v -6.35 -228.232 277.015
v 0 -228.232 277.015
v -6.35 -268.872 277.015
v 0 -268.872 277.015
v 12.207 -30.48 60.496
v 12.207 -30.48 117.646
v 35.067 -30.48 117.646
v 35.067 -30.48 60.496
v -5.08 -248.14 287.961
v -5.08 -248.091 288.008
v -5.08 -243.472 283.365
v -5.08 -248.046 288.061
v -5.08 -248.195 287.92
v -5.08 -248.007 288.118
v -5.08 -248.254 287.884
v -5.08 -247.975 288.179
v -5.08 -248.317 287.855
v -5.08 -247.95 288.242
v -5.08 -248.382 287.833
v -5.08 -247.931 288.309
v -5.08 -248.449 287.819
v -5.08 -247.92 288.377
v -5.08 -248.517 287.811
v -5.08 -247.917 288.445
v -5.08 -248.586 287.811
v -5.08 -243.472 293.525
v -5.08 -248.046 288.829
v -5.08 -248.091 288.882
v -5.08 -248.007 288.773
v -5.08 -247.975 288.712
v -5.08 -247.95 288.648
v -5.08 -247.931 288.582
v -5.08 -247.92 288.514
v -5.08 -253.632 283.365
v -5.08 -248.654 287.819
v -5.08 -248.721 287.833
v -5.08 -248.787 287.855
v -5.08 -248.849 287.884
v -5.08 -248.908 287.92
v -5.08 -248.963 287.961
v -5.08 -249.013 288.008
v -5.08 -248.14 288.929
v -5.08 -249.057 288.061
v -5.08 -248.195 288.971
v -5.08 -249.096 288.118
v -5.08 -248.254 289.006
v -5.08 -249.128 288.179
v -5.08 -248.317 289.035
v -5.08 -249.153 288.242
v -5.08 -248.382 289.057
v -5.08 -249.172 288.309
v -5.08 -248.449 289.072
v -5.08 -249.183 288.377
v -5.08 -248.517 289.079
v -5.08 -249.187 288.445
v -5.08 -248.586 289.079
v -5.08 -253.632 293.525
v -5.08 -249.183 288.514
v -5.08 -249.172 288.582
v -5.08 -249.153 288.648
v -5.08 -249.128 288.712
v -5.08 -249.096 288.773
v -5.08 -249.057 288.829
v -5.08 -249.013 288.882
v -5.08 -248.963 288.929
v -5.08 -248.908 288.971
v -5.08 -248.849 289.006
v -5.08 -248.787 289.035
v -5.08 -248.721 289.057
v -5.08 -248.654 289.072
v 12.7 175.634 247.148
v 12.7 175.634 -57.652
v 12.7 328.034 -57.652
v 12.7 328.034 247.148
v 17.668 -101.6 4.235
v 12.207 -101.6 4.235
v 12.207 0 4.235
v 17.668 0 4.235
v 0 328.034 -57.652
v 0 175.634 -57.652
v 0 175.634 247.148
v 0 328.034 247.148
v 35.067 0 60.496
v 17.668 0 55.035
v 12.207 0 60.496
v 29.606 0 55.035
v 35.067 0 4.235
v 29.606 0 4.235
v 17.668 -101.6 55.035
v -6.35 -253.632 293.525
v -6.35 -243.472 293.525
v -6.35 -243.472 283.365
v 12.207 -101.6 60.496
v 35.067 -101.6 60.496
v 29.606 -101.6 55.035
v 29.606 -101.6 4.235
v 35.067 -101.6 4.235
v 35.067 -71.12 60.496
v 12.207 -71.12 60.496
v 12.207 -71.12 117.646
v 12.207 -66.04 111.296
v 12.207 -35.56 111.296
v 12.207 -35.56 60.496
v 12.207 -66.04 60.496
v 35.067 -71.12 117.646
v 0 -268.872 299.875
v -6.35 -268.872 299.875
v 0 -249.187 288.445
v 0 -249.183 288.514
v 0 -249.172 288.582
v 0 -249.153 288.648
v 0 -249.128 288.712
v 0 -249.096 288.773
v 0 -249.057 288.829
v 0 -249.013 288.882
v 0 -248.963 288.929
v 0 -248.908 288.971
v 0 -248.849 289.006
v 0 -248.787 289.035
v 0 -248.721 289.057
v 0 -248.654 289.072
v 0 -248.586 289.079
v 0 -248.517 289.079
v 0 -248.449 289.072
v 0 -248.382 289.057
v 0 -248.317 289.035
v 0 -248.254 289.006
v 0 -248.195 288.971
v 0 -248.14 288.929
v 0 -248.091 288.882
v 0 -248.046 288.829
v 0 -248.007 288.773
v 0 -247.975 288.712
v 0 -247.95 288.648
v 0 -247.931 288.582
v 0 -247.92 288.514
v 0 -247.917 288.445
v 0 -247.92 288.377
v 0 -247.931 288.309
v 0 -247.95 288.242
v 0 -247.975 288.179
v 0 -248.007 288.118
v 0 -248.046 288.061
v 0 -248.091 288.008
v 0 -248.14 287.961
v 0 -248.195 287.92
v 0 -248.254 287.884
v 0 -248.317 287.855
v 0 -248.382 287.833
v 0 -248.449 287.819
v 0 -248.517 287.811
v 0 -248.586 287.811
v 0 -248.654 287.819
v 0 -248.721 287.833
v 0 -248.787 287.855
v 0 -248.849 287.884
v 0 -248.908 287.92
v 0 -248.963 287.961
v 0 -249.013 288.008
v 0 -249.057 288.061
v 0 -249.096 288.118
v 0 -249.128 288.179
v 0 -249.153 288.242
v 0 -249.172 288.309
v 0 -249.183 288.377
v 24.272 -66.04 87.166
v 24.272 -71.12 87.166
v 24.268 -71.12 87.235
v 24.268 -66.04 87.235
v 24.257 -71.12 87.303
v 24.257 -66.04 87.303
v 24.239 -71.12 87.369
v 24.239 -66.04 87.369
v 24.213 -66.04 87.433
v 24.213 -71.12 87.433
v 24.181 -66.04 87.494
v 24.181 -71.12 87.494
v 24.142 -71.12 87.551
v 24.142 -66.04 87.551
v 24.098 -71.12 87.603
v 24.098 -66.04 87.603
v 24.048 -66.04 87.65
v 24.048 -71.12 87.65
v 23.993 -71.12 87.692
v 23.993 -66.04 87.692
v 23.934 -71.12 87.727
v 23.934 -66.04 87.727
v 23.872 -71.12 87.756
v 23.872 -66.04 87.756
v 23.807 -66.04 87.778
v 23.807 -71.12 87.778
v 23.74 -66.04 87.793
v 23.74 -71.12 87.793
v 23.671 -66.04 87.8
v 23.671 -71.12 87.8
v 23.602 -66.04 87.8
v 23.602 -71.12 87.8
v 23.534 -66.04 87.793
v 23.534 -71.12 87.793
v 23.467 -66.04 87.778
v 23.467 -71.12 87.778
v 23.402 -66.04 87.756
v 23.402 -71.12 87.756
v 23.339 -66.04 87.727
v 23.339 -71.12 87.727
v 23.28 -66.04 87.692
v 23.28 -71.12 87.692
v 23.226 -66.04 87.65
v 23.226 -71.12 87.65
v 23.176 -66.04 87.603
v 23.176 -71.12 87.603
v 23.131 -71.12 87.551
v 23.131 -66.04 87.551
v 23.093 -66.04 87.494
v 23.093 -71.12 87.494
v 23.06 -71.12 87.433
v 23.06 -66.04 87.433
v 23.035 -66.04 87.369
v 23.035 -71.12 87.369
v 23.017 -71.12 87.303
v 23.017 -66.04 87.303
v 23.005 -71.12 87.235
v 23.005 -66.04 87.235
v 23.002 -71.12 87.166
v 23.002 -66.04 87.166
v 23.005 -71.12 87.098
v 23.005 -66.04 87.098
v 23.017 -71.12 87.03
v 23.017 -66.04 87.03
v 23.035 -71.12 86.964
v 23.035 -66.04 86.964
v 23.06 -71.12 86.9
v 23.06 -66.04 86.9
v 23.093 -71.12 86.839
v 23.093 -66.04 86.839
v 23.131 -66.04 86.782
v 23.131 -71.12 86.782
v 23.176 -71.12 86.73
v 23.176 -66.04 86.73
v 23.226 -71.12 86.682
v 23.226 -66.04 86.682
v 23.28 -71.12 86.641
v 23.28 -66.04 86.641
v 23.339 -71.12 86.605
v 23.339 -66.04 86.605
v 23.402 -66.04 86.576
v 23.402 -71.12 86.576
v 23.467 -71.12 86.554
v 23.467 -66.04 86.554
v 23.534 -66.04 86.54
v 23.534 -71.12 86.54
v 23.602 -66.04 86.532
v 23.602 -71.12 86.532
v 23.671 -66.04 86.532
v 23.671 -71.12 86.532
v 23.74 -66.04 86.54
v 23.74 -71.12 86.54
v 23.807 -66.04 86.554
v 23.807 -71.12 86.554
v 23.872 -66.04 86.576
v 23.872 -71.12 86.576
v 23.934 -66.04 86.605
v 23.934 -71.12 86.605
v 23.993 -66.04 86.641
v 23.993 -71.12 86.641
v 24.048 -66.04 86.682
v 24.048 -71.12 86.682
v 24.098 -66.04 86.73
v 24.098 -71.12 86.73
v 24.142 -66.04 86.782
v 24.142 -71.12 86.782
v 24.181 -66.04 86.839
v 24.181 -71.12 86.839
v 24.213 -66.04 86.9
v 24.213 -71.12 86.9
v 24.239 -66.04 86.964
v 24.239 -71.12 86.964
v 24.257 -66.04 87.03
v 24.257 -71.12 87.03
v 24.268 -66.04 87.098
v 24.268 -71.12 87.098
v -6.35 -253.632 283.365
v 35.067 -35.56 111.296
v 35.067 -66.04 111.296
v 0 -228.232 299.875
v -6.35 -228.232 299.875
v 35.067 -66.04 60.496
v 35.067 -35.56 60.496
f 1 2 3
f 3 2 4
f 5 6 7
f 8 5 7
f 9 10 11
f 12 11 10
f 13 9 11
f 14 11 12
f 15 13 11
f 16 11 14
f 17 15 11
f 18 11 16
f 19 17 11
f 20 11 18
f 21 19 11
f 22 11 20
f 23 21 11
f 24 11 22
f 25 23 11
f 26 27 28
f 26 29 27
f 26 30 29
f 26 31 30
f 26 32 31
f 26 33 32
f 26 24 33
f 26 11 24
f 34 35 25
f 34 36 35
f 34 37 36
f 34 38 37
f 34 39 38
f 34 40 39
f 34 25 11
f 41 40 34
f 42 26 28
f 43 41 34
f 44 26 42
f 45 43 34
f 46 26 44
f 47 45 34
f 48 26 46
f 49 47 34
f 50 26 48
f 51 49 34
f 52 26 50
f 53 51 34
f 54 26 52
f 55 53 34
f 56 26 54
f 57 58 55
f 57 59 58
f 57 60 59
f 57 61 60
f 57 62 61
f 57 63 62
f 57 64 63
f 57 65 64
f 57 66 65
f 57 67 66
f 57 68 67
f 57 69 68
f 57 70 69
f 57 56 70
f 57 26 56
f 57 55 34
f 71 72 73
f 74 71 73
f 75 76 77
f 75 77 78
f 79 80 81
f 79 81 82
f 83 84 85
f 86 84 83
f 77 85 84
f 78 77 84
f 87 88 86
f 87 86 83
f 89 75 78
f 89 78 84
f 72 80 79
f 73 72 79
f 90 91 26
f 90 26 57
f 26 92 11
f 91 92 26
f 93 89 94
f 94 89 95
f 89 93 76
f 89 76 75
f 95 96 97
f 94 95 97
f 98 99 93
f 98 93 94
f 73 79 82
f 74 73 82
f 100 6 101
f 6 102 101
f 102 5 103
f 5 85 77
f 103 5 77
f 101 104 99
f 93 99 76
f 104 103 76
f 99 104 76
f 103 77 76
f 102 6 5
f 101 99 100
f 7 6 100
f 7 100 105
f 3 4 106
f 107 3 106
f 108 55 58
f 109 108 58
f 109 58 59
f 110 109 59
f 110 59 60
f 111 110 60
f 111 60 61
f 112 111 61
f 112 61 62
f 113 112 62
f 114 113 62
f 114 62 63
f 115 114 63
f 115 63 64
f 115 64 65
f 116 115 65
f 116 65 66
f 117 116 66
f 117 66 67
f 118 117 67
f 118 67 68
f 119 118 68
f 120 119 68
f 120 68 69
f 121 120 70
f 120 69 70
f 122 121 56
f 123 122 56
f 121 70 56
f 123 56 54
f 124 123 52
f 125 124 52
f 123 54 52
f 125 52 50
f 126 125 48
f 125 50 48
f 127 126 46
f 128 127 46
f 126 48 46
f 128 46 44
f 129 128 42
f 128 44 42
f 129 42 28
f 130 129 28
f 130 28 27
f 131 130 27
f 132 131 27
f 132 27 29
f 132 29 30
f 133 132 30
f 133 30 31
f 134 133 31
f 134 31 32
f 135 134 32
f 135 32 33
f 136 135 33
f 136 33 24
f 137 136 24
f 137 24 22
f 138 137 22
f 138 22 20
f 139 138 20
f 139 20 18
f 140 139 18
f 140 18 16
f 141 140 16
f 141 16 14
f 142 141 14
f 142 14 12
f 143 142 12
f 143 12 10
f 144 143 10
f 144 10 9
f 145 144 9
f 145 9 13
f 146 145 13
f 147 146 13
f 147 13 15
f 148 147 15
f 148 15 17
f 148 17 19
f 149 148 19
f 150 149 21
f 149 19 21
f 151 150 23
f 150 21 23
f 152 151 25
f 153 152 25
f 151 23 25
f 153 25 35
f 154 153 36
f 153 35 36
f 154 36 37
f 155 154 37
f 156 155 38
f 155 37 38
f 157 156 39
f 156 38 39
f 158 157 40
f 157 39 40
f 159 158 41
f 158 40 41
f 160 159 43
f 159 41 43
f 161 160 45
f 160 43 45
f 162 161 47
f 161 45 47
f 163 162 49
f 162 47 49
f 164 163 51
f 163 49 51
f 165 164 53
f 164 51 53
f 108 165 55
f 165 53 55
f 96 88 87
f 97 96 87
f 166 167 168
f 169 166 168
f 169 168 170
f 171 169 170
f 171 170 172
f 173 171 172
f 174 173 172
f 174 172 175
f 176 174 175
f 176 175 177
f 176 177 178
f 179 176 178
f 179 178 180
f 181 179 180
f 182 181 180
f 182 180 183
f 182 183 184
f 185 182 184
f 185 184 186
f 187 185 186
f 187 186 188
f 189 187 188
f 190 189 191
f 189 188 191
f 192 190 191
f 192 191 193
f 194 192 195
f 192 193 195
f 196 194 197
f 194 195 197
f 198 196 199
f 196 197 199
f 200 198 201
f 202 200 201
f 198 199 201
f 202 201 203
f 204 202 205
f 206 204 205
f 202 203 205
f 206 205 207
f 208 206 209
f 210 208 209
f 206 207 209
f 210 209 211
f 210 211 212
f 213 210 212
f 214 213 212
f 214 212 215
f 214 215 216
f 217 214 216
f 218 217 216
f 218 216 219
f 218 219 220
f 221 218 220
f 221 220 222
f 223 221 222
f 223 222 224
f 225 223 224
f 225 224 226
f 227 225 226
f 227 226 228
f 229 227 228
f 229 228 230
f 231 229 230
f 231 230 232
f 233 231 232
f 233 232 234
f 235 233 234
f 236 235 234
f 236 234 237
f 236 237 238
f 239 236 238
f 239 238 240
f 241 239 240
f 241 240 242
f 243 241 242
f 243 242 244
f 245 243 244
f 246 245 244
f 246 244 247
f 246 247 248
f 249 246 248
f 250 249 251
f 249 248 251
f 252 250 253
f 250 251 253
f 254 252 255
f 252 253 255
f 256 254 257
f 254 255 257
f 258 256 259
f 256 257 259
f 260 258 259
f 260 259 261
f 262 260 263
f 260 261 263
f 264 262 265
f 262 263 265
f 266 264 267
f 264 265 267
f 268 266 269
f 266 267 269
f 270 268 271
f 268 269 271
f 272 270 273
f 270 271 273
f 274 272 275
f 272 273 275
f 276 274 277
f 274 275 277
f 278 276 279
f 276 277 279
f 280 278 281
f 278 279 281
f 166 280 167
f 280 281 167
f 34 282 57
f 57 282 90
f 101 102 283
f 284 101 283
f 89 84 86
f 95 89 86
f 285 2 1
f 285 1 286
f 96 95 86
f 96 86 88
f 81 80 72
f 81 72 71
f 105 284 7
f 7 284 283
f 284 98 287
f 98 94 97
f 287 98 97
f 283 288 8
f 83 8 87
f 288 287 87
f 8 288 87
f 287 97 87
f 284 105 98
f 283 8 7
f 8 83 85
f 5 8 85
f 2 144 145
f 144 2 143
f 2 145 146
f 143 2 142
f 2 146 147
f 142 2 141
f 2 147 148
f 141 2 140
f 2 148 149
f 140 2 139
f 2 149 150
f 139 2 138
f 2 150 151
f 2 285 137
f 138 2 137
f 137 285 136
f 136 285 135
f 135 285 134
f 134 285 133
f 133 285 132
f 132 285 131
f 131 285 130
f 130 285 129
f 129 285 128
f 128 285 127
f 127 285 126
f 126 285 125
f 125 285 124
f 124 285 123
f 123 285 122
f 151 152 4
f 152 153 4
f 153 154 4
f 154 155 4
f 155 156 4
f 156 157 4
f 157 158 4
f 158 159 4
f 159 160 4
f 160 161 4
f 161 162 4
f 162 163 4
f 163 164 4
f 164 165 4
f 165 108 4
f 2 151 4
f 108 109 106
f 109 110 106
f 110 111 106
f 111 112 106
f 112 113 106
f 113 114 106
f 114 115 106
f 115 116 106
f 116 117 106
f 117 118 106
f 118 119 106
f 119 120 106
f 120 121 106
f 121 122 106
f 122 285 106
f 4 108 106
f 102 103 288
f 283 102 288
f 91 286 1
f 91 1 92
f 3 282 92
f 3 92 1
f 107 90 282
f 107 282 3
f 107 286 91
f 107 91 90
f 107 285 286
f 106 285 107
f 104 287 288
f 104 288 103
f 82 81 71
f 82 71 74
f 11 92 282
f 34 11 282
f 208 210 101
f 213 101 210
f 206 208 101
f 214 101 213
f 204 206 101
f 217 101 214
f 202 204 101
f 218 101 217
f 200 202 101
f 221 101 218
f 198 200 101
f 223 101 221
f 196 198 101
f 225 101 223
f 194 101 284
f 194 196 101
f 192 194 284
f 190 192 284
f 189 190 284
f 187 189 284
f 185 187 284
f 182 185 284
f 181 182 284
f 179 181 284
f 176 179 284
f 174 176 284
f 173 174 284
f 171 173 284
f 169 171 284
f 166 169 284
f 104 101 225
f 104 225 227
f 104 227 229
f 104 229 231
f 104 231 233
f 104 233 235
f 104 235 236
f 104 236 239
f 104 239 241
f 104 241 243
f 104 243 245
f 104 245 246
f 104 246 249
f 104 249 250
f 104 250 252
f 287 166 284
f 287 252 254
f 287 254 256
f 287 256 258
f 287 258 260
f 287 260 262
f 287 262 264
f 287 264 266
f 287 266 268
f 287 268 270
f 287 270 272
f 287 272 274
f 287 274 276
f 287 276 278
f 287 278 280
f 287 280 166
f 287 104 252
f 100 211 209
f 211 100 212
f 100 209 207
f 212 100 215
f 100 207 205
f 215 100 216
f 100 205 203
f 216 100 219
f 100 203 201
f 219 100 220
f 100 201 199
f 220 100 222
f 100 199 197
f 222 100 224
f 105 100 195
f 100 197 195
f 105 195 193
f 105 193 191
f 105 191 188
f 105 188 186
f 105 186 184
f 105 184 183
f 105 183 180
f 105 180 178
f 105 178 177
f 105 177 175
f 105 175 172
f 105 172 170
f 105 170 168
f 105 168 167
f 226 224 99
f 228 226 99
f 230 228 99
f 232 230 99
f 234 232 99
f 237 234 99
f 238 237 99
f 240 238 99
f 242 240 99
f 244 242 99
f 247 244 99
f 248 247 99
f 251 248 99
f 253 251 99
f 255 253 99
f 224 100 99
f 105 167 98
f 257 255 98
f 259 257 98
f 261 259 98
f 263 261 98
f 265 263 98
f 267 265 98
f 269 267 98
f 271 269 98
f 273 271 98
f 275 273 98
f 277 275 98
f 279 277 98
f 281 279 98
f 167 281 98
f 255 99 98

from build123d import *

# Parameters (mm, degrees)
F1_DEPTH  = 101.6
F2_W      = 152.4
F2_H      = 304.8
F3_DEPTH  = 12.7
F4_W      = 22.86
F4_H      = 5.08
F5_DEPTH  = 50.8
F6_W      = 22.86
F6_H      = 5.08
F6_H_2    = 96.52
F7_DEPTH  = 6.35
F8_R      = 1.27
F9_DEPTH  = 7.62
F10_W     = 22.86
F10_H     = 30.48
F10_R     = 1.27
F11_DEPTH = 57.15
F12_R     = 0.635
F13_DEPTH = 25.4
F14_W     = 40.64
F14_H     = 22.86
F15_DEPTH = 6.35
F16_R     = 0.635
F17_DEPTH = 25.4
F18_W     = 10.16
F18_H     = 10.16
F19_DEPTH = 1.27


with BuildPart() as f1:
    # F0 (on Front) → F1 (new body)
    with BuildSketch(Plane.XZ):
        Polygon((12.206776, 4.235318), (17.667776, 4.235318), (17.667776, 55.035318), (29.605776, 55.035318), (29.605776, 4.235318), (35.066776, 4.235318), (35.066776, 60.496318), (12.206776, 60.496318), align=None)
    extrude(amount=F1_DEPTH)

    # F4 (on face) → F5 (join)
    with BuildSketch(Plane.XY.offset(60.496318)):
        with Locations((23.636776, -2.54)):
            Rectangle(F4_W, F4_H)
        with Locations((23.636776, -33.02)):
            Rectangle(F4_W, F4_H)
        with Locations((23.636776, -68.58)):
            Rectangle(F4_W, F4_H)
        with Locations((23.636776, -99.06)):
            Rectangle(F4_W, F4_H)
    extrude(amount=F5_DEPTH)

    # F6 (on face) → F7 (join)
    with BuildSketch(Plane.XY.offset(111.296318)):
        with Locations((23.636776, -99.06)):
            Rectangle(F6_W, F6_H)
        with Locations((23.636776, -48.26)):
            Rectangle(F6_W, F6_H_2)
    extrude(amount=F7_DEPTH)

    # F8 (on face) → F9 (cut)
    with BuildSketch(Plane.XY.offset(117.646318)):
        with Locations((23.636776, -83.82)):
            Circle(F8_R)
        with Locations((23.636776, -17.78)):
            Circle(F8_R)
    extrude(amount=-F9_DEPTH, mode=Mode.SUBTRACT)

    # F10 (on face) → F11 (cut)
    with BuildSketch(Plane.XY.offset(117.646318)):
        with Locations((23.636776, -86.36)):
            Rectangle(F10_W, F10_H)
        with Locations((23.636776, -83.82)):
            Circle(F10_R, mode=Mode.SUBTRACT)
        with Locations((23.636776, -15.24)):
            Rectangle(F10_W, F10_H)
        with Locations((23.636776, -17.78)):
            Circle(F10_R, mode=Mode.SUBTRACT)
    extrude(amount=-F11_DEPTH, mode=Mode.SUBTRACT)

    # F12 (on face) → F13 (cut)
    with BuildSketch(Plane.XZ.offset(71.12)):
        with Locations((23.636776, 87.166318)):
            Circle(F12_R)
    extrude(amount=-F13_DEPTH, mode=Mode.SUBTRACT)


with BuildPart() as f3:
    # F2 (on Right) → F3 (new body)
    with BuildSketch(Plane.YZ):
        with Locations((251.834206, 94.748187)):
            Rectangle(F2_W, F2_H)
    extrude(amount=F3_DEPTH)


with BuildPart() as f15:
    # F14 (on face) → F15 (new body)
    with BuildSketch(Plane(origin=(0, 0, 0), x_dir=(0, -1, 0), z_dir=(-1, 0, 0))):
        with Locations((248.551563, 288.44516)):
            Rectangle(F14_W, F14_H)
    extrude(amount=F15_DEPTH)

    # F16 (on face) → F17 (cut)
    with BuildSketch(Plane(origin=(-6.35, 0, 0), x_dir=(0, -1, 0), z_dir=(-1, 0, 0))):
        with Locations((248.551563, 288.44516)):
            Circle(F16_R)
    extrude(amount=-F17_DEPTH, mode=Mode.SUBTRACT)

    # F18 (on face) → F19 (cut)
    with BuildSketch(Plane(origin=(-6.35, 0, 0), x_dir=(0, -1, 0), z_dir=(-1, 0, 0))):
        with Locations((248.551563, 288.44516)):
            Rectangle(F18_W, F18_H)
    extrude(amount=-F19_DEPTH, mode=Mode.SUBTRACT)


solid = Compound([f1.part, f3.part, f15.part])
